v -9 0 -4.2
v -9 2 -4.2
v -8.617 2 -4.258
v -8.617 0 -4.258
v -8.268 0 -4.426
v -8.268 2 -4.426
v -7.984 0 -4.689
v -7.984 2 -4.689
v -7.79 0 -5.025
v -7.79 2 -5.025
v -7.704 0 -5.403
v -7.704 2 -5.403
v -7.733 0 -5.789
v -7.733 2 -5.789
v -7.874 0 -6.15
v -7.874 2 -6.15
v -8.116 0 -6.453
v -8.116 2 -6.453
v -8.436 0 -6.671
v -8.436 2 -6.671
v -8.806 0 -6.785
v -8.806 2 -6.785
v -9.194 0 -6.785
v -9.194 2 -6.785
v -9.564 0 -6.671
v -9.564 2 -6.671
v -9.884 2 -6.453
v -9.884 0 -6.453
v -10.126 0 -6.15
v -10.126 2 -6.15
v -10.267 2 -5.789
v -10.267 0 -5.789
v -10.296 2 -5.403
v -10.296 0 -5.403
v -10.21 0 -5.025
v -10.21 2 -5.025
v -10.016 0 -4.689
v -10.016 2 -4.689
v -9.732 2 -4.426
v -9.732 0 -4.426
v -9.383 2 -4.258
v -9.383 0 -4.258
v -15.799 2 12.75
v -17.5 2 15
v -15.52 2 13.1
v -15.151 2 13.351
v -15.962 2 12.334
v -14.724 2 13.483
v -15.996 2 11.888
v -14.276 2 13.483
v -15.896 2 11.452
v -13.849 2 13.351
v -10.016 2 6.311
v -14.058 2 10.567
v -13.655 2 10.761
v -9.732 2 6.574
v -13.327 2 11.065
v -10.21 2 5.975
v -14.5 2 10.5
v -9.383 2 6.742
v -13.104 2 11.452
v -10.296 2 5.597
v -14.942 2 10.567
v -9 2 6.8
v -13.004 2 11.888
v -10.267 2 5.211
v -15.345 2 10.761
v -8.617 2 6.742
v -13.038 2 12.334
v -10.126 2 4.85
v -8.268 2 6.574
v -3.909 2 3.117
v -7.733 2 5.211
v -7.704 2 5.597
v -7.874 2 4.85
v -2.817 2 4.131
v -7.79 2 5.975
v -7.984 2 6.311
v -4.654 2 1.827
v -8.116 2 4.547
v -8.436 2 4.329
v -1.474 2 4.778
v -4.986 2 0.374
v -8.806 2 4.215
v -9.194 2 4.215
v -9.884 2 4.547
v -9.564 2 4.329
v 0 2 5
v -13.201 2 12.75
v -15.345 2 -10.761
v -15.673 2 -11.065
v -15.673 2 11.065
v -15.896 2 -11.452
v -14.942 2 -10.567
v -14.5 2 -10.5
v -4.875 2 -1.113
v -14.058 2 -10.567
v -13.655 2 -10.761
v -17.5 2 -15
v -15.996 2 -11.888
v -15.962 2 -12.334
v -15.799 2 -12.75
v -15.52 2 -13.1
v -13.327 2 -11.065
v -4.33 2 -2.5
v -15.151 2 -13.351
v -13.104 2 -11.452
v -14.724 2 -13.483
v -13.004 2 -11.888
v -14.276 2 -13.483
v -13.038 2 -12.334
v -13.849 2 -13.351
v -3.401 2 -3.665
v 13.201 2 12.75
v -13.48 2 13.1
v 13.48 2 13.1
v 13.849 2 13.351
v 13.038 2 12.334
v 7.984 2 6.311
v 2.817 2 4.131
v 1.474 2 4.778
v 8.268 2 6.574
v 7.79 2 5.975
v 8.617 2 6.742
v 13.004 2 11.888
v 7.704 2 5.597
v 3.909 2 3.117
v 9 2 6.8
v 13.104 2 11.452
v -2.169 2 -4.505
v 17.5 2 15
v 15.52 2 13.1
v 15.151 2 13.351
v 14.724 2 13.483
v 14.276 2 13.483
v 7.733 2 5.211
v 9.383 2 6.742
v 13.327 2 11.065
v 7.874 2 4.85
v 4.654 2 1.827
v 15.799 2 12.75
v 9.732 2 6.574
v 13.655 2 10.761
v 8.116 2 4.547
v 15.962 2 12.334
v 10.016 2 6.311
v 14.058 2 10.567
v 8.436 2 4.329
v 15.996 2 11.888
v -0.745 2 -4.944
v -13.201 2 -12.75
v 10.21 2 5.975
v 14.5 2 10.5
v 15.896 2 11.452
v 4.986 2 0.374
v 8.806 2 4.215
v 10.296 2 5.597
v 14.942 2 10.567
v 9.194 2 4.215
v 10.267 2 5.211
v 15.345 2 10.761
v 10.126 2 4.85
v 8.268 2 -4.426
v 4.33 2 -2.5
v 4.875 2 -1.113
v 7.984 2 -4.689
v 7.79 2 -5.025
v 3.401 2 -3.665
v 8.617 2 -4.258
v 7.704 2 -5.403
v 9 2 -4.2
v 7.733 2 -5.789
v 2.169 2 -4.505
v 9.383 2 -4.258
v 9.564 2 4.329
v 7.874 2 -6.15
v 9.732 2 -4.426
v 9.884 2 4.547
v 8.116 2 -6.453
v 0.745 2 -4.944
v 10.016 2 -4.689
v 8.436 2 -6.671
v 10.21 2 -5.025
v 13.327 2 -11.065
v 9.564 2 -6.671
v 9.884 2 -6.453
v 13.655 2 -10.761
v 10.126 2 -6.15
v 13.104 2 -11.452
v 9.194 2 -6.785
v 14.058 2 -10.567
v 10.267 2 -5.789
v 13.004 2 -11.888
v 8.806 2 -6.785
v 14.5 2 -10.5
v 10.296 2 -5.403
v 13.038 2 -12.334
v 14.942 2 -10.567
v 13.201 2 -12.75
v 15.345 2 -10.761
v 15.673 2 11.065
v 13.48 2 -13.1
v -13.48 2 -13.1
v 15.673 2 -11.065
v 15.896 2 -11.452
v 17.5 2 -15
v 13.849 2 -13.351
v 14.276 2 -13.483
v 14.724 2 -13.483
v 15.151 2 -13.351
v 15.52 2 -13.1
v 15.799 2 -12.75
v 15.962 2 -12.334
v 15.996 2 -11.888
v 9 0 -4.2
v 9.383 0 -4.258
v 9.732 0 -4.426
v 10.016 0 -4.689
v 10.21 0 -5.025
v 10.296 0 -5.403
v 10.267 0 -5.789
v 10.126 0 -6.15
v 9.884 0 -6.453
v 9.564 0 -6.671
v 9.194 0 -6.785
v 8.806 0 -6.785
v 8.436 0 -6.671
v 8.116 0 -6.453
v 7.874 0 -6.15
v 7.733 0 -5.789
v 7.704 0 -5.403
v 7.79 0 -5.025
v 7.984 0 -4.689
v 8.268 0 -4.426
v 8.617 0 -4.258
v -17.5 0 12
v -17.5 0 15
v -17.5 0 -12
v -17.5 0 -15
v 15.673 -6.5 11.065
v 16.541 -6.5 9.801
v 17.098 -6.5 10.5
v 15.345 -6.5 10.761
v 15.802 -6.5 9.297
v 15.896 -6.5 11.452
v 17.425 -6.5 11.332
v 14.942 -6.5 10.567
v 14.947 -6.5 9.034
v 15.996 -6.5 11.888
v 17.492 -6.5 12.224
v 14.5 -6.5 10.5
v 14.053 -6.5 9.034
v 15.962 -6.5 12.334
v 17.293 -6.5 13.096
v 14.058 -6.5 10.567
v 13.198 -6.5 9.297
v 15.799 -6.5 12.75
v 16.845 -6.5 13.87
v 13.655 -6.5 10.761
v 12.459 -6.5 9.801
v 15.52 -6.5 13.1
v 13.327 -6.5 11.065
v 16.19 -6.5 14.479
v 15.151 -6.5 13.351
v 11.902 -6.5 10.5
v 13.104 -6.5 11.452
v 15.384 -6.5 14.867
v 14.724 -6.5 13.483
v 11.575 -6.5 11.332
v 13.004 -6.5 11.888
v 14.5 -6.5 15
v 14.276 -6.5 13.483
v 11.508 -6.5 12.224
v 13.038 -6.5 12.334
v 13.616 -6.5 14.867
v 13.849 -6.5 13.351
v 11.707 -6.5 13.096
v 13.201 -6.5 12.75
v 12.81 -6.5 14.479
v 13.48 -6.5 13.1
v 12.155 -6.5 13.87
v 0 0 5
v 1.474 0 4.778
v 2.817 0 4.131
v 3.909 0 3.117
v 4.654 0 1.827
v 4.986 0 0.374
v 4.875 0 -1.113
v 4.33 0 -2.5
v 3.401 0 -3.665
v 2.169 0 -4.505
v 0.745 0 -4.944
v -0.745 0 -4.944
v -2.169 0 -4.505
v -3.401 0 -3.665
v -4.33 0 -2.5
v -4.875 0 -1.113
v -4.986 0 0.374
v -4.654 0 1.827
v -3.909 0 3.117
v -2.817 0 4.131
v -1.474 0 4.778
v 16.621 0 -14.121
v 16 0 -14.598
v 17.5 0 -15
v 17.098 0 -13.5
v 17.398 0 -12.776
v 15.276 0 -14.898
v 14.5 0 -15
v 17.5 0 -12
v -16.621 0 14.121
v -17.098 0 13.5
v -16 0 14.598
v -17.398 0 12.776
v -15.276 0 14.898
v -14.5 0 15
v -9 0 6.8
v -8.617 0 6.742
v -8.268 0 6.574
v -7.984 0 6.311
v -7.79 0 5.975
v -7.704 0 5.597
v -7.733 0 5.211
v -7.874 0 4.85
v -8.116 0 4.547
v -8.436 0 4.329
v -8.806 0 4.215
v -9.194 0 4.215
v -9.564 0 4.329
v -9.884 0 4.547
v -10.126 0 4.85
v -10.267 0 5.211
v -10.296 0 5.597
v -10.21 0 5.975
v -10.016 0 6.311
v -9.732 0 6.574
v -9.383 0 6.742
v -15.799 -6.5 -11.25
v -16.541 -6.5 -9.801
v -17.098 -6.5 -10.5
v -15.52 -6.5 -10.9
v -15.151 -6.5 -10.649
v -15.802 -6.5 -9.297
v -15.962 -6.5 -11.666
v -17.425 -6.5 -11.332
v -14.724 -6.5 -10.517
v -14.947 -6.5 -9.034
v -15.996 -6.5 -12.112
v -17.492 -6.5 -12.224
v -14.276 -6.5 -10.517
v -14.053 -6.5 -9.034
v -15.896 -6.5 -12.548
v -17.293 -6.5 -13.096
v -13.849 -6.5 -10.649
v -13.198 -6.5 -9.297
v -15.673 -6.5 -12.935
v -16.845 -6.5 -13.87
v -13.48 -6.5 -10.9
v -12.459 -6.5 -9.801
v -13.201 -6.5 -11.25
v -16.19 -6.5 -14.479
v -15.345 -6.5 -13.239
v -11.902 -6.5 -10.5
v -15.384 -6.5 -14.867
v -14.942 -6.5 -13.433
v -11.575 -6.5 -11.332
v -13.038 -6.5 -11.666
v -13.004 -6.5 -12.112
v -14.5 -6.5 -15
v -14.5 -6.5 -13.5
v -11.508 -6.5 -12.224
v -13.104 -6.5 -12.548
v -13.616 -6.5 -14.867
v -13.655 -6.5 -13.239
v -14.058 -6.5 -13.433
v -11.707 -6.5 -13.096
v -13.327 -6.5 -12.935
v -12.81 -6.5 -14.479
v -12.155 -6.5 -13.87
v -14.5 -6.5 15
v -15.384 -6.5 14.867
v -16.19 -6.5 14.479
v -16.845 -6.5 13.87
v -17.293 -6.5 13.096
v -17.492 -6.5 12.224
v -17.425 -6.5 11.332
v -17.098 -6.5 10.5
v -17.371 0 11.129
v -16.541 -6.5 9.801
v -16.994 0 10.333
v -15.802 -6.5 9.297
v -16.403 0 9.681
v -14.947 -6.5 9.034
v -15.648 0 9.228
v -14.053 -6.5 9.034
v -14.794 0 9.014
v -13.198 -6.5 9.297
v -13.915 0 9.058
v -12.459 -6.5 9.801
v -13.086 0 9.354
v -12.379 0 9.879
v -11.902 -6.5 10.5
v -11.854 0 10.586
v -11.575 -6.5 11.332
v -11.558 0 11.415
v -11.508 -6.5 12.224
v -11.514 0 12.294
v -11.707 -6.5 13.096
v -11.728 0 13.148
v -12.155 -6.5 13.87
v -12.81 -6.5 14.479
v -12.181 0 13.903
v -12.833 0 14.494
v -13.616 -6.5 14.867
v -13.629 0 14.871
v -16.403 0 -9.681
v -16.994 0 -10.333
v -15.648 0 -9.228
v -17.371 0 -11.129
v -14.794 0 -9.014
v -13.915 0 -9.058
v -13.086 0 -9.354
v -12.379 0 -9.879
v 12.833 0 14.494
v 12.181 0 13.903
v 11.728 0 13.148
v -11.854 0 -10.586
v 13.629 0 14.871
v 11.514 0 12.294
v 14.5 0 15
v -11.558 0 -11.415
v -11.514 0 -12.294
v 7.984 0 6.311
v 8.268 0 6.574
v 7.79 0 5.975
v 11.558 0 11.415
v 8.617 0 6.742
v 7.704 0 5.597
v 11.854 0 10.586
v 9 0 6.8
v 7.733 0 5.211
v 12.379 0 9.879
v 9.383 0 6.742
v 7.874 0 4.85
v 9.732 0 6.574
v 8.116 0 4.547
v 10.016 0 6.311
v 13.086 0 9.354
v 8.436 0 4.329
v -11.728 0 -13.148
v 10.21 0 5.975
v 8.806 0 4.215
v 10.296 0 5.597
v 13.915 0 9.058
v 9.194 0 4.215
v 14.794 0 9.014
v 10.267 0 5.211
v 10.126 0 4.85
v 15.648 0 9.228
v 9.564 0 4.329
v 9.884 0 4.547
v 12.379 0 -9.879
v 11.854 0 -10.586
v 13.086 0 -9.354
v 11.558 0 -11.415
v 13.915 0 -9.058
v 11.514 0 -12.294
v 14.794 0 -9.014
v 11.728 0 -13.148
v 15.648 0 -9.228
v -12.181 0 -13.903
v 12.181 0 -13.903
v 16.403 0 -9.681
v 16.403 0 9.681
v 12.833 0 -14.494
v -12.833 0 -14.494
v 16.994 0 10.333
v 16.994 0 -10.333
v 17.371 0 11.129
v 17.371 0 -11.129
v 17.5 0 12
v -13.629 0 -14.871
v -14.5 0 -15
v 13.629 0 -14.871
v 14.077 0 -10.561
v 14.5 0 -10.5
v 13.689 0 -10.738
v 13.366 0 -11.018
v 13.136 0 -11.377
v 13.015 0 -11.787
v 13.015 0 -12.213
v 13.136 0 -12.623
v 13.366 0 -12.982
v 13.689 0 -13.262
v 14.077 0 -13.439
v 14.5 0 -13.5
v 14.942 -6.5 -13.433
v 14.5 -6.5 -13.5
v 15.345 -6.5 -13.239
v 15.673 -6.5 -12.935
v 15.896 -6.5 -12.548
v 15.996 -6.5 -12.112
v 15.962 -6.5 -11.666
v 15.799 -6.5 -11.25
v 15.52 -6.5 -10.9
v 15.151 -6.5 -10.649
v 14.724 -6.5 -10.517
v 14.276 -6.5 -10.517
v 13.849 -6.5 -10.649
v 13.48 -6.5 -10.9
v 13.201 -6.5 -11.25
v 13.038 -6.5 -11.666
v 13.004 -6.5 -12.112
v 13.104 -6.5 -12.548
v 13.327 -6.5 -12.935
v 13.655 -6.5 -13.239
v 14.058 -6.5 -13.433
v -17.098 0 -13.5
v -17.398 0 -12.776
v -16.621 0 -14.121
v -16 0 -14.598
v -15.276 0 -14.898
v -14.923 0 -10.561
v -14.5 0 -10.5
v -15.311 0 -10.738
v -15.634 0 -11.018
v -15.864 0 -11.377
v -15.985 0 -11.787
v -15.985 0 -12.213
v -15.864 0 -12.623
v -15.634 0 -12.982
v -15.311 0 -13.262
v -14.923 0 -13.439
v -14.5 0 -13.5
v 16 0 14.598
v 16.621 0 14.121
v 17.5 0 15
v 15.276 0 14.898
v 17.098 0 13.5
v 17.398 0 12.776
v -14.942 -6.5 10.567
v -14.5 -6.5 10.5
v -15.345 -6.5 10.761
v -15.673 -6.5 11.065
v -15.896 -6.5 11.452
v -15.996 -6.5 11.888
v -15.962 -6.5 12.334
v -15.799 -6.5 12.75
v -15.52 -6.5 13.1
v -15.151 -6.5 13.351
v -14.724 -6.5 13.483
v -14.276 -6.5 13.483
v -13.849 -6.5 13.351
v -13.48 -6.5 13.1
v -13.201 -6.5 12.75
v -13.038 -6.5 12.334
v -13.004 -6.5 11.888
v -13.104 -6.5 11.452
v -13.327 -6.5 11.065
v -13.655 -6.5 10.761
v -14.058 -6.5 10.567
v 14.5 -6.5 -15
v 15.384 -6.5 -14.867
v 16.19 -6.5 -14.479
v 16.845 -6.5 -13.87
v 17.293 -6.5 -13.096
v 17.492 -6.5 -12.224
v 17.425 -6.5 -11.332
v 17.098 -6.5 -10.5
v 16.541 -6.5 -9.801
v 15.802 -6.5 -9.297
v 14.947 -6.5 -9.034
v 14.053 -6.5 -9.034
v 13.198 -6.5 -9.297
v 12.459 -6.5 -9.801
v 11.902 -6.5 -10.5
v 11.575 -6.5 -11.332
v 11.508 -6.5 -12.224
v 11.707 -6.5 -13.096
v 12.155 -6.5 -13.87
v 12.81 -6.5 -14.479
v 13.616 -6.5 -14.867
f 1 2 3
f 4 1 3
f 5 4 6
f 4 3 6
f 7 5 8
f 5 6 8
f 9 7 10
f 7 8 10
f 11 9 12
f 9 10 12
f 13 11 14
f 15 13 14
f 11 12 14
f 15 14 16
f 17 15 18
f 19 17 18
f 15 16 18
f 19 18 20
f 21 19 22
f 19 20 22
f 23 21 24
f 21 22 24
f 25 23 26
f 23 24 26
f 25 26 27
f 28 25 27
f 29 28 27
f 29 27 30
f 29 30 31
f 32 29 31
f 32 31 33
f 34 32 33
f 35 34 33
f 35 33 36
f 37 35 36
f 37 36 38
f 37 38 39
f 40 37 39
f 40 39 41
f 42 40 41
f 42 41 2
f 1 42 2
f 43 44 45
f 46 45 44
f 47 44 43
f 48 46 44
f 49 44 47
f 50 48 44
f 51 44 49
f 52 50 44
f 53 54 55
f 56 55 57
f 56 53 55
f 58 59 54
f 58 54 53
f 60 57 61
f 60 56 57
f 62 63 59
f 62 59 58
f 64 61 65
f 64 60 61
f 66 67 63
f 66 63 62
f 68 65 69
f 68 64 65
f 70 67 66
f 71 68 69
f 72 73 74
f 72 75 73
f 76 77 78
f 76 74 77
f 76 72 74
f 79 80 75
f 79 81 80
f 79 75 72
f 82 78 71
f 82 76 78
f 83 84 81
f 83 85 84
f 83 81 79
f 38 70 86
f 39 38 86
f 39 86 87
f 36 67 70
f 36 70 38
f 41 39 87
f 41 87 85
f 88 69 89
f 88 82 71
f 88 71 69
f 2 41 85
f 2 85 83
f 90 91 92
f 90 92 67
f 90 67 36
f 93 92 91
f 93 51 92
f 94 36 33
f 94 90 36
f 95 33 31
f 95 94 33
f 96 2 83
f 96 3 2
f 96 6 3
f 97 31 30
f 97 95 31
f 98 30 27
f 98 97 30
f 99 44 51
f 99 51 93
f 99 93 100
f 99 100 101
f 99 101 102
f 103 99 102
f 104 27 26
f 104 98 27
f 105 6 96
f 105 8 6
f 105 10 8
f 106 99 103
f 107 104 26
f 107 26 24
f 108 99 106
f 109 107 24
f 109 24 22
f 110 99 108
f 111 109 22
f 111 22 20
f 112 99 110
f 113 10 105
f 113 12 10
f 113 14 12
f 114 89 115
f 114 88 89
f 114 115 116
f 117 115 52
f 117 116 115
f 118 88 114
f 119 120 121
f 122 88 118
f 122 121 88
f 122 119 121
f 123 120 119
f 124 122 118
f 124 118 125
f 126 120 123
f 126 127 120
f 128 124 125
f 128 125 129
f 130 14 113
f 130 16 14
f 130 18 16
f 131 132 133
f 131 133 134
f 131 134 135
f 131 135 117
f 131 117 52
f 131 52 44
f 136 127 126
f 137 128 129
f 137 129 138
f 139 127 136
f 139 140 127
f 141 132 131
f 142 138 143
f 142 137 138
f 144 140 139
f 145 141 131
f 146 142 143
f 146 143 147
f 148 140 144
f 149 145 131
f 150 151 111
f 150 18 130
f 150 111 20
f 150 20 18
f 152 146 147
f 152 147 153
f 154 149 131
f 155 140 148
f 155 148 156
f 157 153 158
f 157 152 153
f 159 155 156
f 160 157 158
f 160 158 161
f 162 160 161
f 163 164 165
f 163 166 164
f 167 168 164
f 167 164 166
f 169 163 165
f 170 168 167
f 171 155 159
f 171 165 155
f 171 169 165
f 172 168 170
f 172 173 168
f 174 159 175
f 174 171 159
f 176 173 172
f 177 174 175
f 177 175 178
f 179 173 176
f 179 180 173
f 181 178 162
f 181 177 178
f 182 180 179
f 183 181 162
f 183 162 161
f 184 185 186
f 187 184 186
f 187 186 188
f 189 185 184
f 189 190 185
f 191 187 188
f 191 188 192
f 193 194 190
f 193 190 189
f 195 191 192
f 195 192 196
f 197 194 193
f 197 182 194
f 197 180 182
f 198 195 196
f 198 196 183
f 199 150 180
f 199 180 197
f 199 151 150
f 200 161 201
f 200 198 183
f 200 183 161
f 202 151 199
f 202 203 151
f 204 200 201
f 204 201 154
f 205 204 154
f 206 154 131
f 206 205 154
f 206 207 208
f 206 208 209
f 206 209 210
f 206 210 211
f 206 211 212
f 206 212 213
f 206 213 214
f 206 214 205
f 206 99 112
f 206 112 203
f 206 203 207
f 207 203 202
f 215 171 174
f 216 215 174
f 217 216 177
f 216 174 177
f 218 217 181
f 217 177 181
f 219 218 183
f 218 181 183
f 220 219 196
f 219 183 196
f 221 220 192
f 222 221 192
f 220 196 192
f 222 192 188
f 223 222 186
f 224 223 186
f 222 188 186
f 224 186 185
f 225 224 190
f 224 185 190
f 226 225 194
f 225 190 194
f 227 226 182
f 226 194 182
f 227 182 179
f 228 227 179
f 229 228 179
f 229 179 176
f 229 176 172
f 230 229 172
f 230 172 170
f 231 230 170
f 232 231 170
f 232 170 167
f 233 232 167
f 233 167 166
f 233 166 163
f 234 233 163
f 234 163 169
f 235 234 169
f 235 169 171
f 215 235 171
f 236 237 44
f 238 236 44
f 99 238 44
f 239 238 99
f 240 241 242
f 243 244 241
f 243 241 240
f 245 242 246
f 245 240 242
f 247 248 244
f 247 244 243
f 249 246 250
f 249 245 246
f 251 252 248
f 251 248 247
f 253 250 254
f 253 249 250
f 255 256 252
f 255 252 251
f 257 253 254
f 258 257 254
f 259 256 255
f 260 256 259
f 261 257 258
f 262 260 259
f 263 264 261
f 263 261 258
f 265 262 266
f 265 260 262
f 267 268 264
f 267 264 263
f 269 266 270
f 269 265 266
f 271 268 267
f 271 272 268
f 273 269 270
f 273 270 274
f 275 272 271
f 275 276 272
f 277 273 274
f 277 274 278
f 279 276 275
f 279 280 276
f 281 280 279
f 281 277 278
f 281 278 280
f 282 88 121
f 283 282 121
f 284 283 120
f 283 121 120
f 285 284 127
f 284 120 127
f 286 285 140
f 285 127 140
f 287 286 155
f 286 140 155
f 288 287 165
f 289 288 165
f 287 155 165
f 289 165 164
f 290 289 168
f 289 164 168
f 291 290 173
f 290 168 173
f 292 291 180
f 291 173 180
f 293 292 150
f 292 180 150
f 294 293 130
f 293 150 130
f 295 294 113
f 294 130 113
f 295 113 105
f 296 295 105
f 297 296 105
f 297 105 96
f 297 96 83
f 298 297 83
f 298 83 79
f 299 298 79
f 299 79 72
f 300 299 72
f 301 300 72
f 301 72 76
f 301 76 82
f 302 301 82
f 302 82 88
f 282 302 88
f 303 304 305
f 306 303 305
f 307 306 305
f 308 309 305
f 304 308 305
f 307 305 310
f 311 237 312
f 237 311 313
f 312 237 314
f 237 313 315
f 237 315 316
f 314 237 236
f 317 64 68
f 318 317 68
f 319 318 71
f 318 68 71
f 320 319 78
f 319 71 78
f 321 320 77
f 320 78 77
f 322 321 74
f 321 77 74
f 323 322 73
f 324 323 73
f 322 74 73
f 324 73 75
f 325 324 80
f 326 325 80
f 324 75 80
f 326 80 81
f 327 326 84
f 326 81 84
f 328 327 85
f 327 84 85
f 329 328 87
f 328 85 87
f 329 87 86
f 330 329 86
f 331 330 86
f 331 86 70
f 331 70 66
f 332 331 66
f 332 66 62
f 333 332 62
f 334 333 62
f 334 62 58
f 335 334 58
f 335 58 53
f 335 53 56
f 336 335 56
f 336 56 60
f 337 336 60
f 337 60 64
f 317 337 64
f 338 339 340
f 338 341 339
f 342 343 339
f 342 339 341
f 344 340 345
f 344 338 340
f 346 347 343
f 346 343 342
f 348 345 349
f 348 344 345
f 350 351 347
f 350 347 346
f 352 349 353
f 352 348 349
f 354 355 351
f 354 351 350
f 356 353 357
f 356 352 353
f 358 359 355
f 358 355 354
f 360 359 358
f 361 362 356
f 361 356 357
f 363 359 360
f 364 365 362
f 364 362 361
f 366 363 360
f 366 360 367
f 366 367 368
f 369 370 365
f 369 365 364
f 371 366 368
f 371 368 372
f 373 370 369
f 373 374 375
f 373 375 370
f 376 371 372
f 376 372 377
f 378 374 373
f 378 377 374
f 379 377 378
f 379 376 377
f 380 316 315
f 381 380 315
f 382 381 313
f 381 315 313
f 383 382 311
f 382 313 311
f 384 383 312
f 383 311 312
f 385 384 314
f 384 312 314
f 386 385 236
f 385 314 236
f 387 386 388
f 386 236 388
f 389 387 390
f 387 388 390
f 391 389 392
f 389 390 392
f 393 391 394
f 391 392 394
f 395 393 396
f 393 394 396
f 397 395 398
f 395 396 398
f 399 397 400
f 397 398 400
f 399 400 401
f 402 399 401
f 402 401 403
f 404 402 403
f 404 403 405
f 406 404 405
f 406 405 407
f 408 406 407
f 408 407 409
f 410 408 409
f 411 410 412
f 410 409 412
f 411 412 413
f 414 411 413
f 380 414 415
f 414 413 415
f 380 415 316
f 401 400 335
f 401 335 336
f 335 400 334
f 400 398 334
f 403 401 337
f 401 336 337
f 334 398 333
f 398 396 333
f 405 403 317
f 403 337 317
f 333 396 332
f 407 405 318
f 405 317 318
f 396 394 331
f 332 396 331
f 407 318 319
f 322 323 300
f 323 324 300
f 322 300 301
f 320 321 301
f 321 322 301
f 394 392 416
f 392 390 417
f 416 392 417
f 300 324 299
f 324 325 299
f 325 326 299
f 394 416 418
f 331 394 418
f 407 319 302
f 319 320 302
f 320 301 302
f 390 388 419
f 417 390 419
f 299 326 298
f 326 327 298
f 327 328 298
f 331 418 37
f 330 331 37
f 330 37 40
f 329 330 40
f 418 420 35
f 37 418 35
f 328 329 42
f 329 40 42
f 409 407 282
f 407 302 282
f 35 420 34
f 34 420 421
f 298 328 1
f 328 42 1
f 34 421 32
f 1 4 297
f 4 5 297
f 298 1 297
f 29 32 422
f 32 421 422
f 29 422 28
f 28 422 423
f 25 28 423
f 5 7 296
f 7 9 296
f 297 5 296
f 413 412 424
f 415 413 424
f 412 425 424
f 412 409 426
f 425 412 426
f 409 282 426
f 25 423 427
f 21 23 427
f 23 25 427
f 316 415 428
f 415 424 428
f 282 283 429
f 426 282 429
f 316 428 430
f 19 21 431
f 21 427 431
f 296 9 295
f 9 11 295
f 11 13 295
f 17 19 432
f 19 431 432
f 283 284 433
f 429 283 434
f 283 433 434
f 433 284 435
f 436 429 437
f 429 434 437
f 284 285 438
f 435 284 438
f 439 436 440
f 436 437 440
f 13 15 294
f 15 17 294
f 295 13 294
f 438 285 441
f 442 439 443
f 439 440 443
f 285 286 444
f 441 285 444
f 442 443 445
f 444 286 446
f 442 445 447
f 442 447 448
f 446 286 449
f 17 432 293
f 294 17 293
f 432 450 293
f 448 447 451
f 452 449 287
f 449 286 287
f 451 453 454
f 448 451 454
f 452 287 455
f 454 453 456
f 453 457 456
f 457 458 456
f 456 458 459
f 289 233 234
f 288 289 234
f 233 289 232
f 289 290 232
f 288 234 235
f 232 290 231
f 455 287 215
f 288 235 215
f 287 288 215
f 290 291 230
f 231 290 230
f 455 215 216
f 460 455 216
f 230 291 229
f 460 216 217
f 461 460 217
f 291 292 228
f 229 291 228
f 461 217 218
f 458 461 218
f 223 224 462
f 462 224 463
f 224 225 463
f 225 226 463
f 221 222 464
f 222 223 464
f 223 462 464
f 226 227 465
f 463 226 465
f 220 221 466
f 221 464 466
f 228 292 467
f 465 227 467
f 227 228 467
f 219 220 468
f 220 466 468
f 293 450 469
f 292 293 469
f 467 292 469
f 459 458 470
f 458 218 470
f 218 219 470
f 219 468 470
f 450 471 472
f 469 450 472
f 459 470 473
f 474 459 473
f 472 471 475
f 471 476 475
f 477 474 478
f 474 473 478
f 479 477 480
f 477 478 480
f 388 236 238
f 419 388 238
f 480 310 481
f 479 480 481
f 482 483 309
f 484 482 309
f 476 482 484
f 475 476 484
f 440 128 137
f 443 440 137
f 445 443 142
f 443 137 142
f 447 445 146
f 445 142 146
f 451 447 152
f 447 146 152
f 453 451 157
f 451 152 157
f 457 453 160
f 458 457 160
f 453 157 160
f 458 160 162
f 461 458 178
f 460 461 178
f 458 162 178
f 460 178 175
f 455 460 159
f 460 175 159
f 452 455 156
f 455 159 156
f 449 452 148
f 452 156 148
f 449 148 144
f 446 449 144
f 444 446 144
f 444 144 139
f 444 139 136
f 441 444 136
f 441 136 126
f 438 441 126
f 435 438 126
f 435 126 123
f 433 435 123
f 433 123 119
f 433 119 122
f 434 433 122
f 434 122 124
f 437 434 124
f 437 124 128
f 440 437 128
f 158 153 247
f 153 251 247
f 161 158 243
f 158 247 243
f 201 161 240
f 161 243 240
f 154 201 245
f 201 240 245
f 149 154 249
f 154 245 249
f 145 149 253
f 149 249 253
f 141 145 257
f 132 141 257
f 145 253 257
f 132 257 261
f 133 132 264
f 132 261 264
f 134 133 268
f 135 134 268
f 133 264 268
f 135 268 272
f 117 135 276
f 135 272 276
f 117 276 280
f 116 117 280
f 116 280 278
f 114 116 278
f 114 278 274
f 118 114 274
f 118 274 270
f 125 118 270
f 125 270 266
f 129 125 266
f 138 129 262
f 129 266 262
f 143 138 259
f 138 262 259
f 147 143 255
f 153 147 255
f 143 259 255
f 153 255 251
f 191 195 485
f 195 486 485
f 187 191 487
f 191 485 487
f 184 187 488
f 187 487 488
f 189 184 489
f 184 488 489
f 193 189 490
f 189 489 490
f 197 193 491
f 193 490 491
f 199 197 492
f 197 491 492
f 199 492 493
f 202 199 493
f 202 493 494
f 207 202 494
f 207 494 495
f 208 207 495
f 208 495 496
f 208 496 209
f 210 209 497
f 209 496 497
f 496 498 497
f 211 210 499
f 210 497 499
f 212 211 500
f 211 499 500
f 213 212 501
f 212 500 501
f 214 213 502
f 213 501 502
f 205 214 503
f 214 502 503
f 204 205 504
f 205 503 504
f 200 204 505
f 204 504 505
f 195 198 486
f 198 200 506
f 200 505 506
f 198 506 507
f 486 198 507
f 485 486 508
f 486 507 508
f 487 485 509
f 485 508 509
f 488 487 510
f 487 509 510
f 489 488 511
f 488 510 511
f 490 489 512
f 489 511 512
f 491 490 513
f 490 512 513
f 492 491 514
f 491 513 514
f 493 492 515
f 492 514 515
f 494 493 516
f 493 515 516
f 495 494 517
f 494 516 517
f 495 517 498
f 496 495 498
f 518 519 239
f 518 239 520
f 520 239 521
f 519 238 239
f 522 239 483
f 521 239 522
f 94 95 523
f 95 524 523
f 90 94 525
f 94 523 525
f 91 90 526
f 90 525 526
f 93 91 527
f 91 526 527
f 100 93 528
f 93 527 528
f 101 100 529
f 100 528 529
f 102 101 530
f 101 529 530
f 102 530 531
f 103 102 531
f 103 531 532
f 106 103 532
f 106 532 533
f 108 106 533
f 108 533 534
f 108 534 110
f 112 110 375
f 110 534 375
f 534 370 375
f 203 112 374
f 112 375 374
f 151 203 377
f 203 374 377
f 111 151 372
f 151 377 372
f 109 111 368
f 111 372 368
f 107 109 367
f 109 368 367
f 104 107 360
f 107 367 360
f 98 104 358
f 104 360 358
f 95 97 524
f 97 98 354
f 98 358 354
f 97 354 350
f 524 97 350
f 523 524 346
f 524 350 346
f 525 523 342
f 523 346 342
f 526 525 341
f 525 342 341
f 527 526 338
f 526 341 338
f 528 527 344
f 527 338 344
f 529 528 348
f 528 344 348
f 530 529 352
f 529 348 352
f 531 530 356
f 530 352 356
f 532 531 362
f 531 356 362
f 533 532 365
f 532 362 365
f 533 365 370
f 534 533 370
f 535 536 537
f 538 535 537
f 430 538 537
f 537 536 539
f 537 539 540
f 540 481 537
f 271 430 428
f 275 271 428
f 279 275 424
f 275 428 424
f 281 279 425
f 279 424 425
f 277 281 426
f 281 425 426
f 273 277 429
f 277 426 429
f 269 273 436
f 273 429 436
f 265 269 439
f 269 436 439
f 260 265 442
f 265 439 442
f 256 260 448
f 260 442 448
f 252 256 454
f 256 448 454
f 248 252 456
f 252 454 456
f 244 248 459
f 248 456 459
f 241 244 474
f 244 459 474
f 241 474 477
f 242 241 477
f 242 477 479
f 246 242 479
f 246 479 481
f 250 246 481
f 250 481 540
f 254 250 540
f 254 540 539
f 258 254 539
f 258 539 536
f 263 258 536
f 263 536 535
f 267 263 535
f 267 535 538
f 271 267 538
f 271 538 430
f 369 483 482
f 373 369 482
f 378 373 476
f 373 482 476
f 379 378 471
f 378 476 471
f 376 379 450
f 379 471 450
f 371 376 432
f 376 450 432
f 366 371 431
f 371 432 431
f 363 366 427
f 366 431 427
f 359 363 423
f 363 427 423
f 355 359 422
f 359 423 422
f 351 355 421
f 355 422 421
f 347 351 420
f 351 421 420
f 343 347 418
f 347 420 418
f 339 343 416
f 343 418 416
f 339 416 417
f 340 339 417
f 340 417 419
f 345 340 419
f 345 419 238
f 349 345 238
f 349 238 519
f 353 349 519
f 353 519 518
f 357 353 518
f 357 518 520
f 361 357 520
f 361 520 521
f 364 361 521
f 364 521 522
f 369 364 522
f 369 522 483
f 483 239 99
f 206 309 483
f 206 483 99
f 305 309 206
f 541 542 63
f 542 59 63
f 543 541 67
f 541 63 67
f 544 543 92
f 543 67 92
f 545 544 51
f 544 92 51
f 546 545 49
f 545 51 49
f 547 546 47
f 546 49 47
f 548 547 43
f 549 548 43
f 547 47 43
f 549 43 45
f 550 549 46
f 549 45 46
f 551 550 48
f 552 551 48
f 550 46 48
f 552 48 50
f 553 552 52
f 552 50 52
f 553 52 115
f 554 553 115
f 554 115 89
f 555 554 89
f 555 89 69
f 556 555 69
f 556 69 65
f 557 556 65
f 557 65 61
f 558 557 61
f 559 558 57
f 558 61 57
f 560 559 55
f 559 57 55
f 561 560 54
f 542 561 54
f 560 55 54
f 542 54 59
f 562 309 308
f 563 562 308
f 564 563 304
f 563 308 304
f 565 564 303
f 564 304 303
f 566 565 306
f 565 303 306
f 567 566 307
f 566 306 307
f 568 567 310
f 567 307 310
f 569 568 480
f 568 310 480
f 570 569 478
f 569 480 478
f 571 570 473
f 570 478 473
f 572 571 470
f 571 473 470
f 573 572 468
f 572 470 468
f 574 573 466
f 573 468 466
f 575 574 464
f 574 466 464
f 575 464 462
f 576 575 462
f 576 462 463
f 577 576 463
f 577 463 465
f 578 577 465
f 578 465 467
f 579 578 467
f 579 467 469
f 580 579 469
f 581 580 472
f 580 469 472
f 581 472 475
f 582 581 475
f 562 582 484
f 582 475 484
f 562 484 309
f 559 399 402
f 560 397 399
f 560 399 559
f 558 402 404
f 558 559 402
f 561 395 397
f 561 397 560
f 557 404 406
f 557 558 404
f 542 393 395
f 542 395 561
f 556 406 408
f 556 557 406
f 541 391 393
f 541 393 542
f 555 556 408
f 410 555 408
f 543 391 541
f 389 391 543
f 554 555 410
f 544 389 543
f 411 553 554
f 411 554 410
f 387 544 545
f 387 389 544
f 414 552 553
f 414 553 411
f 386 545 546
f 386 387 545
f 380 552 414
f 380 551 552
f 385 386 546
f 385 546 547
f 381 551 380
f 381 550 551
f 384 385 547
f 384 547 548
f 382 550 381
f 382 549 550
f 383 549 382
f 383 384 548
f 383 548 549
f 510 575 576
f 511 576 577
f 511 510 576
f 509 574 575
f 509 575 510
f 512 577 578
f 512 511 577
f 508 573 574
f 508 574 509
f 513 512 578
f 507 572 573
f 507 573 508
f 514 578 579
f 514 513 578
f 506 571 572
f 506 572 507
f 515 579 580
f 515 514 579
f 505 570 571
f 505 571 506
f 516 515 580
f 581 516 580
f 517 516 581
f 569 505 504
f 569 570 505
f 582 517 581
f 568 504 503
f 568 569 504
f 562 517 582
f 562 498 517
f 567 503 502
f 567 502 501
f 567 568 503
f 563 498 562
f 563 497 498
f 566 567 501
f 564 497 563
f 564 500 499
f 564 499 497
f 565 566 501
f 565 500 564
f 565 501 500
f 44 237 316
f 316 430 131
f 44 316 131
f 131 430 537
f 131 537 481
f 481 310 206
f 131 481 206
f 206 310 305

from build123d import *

# Parameters (mm, degrees)
SKETCH1_W           = 35
SKETCH1_H           = 30
BOSS_EXTRUDE1_DEPTH = 2
CUT_EXTRUDE1_REACH  = 25.135
SKETCH2_R           = 1.3
CUT_EXTRUDE2_REACH  = 25.135
SKETCH3_R           = 1.5
SKETCH4_R           = 3
BOSS_EXTRUDE2_DEPTH = 6.5
CUT_EXTRUDE3_REACH  = 25.948
SKETCH5_R           = 1.5
SKETCH7_R           = 5
CUT_EXTRUDE4_DEPTH  = 3


with BuildPart() as part:
    # Sketch1 → Boss-Extrude1 (new body)
    with BuildSketch(Plane(origin=(0, 0, 0), x_dir=(1, 0, 0), z_dir=(0, 1, 0))):
        Rectangle(SKETCH1_W, SKETCH1_H)
    extrude(amount=BOSS_EXTRUDE1_DEPTH)

    # Sketch2 → Cut-Extrude1 (cut, up to next)
    with BuildSketch(Plane(origin=(0, 2, 0), x_dir=(1, 0, 0), z_dir=(0, 1, 0)), mode=Mode.PRIVATE) as cut_extrude1_sk1:
        with Locations(Location((9, 5.5, 0), (0, 0, 270))):
            Circle(SKETCH2_R)
    cut_extrude1_tool1 = extrude(cut_extrude1_sk1.sketch, amount=-CUT_EXTRUDE1_REACH, mode=Mode.PRIVATE) & part.part
    # Sketch2 → Cut-Extrude1 (cut, up to next)
    with BuildSketch(Plane(origin=(0, 2, 0), x_dir=(1, 0, 0), z_dir=(0, 1, 0)), mode=Mode.PRIVATE) as cut_extrude1_sk2:
        with Locations(Location((-9, 5.5, 0), (0, 0, 270))):
            Circle(SKETCH2_R)
    cut_extrude1_tool2 = extrude(cut_extrude1_sk2.sketch, amount=-CUT_EXTRUDE1_REACH, mode=Mode.PRIVATE) & part.part
    # Sketch2 → Cut-Extrude1 (cut, up to next)
    with BuildSketch(Plane(origin=(0, 2, 0), x_dir=(1, 0, 0), z_dir=(0, 1, 0)), mode=Mode.PRIVATE) as cut_extrude1_sk3:
        with Locations(Location((9, -5.5, 0), (0, 0, 270))):
            Circle(SKETCH2_R)
    cut_extrude1_tool3 = extrude(cut_extrude1_sk3.sketch, amount=-CUT_EXTRUDE1_REACH, mode=Mode.PRIVATE) & part.part
    # Sketch2 → Cut-Extrude1 (cut, up to next)
    with BuildSketch(Plane(origin=(0, 2, 0), x_dir=(1, 0, 0), z_dir=(0, 1, 0)), mode=Mode.PRIVATE) as cut_extrude1_sk4:
        with Locations(Location((-9, -5.5, 0), (0, 0, 270))):
            Circle(SKETCH2_R)
    cut_extrude1_tool4 = extrude(cut_extrude1_sk4.sketch, amount=-CUT_EXTRUDE1_REACH, mode=Mode.PRIVATE) & part.part
    add(cut_extrude1_tool1.solids().sort_by_distance((9, 2, -5.5))[0], mode=Mode.SUBTRACT)
    add(cut_extrude1_tool2.solids().sort_by_distance((-9, 2, -5.5))[0], mode=Mode.SUBTRACT)
    add(cut_extrude1_tool3.solids().sort_by_distance((9, 2, 5.5))[0], mode=Mode.SUBTRACT)
    add(cut_extrude1_tool4.solids().sort_by_distance((-9, 2, 5.5))[0], mode=Mode.SUBTRACT)

    # Sketch3 → Cut-Extrude2 (cut, up to next)
    with BuildSketch(Plane.XZ, mode=Mode.PRIVATE) as cut_extrude2_sk1:
        with Locations(Location((-14.5, 12, 0), (0, 0, 270))):
            Circle(SKETCH3_R)
    cut_extrude2_tool1 = extrude(cut_extrude2_sk1.sketch, amount=-CUT_EXTRUDE2_REACH, mode=Mode.PRIVATE) & part.part
    # Sketch3 → Cut-Extrude2 (cut, up to next)
    with BuildSketch(Plane.XZ, mode=Mode.PRIVATE) as cut_extrude2_sk2:
        with Locations(Location((14.5, 12, 0), (0, 0, 270))):
            Circle(SKETCH3_R)
    cut_extrude2_tool2 = extrude(cut_extrude2_sk2.sketch, amount=-CUT_EXTRUDE2_REACH, mode=Mode.PRIVATE) & part.part
    # Sketch3 → Cut-Extrude2 (cut, up to next)
    with BuildSketch(Plane.XZ, mode=Mode.PRIVATE) as cut_extrude2_sk3:
        with Locations(Location((14.5, -12, 0), (0, 0, 90))):
            Circle(SKETCH3_R)
    cut_extrude2_tool3 = extrude(cut_extrude2_sk3.sketch, amount=-CUT_EXTRUDE2_REACH, mode=Mode.PRIVATE) & part.part
    # Sketch3 → Cut-Extrude2 (cut, up to next)
    with BuildSketch(Plane.XZ, mode=Mode.PRIVATE) as cut_extrude2_sk4:
        with Locations(Location((-14.5, -12, 0), (0, 0, 90))):
            Circle(SKETCH3_R)
    cut_extrude2_tool4 = extrude(cut_extrude2_sk4.sketch, amount=-CUT_EXTRUDE2_REACH, mode=Mode.PRIVATE) & part.part
    add(cut_extrude2_tool1.solids().sort_by_distance((-14.5, 0, 12))[0], mode=Mode.SUBTRACT)
    add(cut_extrude2_tool2.solids().sort_by_distance((14.5, 0, 12))[0], mode=Mode.SUBTRACT)
    add(cut_extrude2_tool3.solids().sort_by_distance((14.5, 0, -12))[0], mode=Mode.SUBTRACT)
    add(cut_extrude2_tool4.solids().sort_by_distance((-14.5, 0, -12))[0], mode=Mode.SUBTRACT)

    # Sketch4 → Boss-Extrude2 (add)
    with BuildSketch(Plane.XZ):
        with Locations(Location((-14.5, 12, 0), (0, 0, 90))):
            Circle(SKETCH4_R)
        with Locations(Location((14.5, 12, 0), (0, 0, 90))):
            Circle(SKETCH4_R)
        with Locations(Location((-14.5, -12, 0), (0, 0, 270))):
            Circle(SKETCH4_R)
        with Locations(Location((14.5, -12, 0), (0, 0, 270))):
            Circle(SKETCH4_R)
    extrude(amount=BOSS_EXTRUDE2_DEPTH)

    # Sketch5 → Cut-Extrude3 (cut, up to next)
    with BuildSketch(Plane(origin=(0, 0, 0), x_dir=(1, 0, 0), z_dir=(0, 1, 0)), mode=Mode.PRIVATE) as cut_extrude3_sk1:
        with Locations(Location((-14.5, 12, 0), (0, 0, 90))):
            Circle(SKETCH5_R)
    cut_extrude3_tool1 = extrude(cut_extrude3_sk1.sketch, amount=-CUT_EXTRUDE3_REACH, mode=Mode.PRIVATE) & part.part
    # Sketch5 → Cut-Extrude3 (cut, up to next)
    with BuildSketch(Plane(origin=(0, 0, 0), x_dir=(1, 0, 0), z_dir=(0, 1, 0)), mode=Mode.PRIVATE) as cut_extrude3_sk2:
        with Locations(Location((14.5, 12, 0), (0, 0, 90))):
            Circle(SKETCH5_R)
    cut_extrude3_tool2 = extrude(cut_extrude3_sk2.sketch, amount=-CUT_EXTRUDE3_REACH, mode=Mode.PRIVATE) & part.part
    # Sketch5 → Cut-Extrude3 (cut, up to next)
    with BuildSketch(Plane(origin=(0, 0, 0), x_dir=(1, 0, 0), z_dir=(0, 1, 0)), mode=Mode.PRIVATE) as cut_extrude3_sk3:
        with Locations(Location((14.5, -12, 0), (0, 0, 90))):
            Circle(SKETCH5_R)
    cut_extrude3_tool3 = extrude(cut_extrude3_sk3.sketch, amount=-CUT_EXTRUDE3_REACH, mode=Mode.PRIVATE) & part.part
    # Sketch5 → Cut-Extrude3 (cut, up to next)
    with BuildSketch(Plane(origin=(0, 0, 0), x_dir=(1, 0, 0), z_dir=(0, 1, 0)), mode=Mode.PRIVATE) as cut_extrude3_sk4:
        with Locations(Location((-14.5, -12, 0), (0, 0, 90))):
            Circle(SKETCH5_R)
    cut_extrude3_tool4 = extrude(cut_extrude3_sk4.sketch, amount=-CUT_EXTRUDE3_REACH, mode=Mode.PRIVATE) & part.part
    add(cut_extrude3_tool1.solids().sort_by_distance((-14.5, 0, -12))[0], mode=Mode.SUBTRACT)
    add(cut_extrude3_tool2.solids().sort_by_distance((14.5, 0, -12))[0], mode=Mode.SUBTRACT)
    add(cut_extrude3_tool3.solids().sort_by_distance((14.5, 0, 12))[0], mode=Mode.SUBTRACT)
    add(cut_extrude3_tool4.solids().sort_by_distance((-14.5, 0, 12))[0], mode=Mode.SUBTRACT)

    # Sketch7 → Cut-Extrude4 (cut)
    with BuildSketch(Plane(origin=(0, 2, 0), x_dir=(1, 0, 0), z_dir=(0, 1, 0))):
        with Locations(Location((0, 0, 0), (0, 0, 270))):
            Circle(SKETCH7_R)
    extrude(amount=-CUT_EXTRUDE4_DEPTH, mode=Mode.SUBTRACT)


solid = part.part
